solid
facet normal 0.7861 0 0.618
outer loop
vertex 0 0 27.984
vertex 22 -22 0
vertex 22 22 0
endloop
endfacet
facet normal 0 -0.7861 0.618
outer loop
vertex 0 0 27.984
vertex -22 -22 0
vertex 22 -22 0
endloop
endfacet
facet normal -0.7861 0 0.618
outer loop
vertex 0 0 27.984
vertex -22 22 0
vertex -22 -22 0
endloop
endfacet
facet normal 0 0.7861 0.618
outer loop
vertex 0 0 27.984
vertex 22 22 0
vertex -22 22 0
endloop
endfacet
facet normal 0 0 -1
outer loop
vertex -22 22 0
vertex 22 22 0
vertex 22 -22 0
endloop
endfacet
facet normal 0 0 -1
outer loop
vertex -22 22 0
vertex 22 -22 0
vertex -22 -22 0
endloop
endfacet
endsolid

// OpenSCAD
// Pi derived from a whole number.
// for 999999 inspired by Shek Singhal
// implemented as a Pyramid
// see: http://vortexspace.org/display/theory/Phe+-+Universal+Curvature+Constant

Phe = 1 / sqrt((sqrt(5)+1)/2); // =~ 0.78615137775742(...)

//r = 220; // * actual unit for this object is a royal_cubit =~ 523 to 529 mm

// Radius
r = 22; // 0.22-222222  
h = r / Phe;

color ("PaleGoldenrod")
polyhedron(
  points=[ [r,r,0],[r,-r,0],[-r,-r,0],[-r,r,0], // the four points at base
//           [0,0,r]  ],                        // the apex point for Cheops
           [0,0,h]  ],                          // the apex point for half an octahedron
  triangles=[ [0,1,4],[1,2,4],[2,3,4],[3,0,4],  // each triangle side
              [1,0,3],[2,1,3] ]                 // two triangles for square base
);

// other stuff
// slant_height = r / Phe / Phe;
// CircleArea = (4*r) * (sqrt( 2) * Phe);
// CircleCircum = (8*r) * Phe;
